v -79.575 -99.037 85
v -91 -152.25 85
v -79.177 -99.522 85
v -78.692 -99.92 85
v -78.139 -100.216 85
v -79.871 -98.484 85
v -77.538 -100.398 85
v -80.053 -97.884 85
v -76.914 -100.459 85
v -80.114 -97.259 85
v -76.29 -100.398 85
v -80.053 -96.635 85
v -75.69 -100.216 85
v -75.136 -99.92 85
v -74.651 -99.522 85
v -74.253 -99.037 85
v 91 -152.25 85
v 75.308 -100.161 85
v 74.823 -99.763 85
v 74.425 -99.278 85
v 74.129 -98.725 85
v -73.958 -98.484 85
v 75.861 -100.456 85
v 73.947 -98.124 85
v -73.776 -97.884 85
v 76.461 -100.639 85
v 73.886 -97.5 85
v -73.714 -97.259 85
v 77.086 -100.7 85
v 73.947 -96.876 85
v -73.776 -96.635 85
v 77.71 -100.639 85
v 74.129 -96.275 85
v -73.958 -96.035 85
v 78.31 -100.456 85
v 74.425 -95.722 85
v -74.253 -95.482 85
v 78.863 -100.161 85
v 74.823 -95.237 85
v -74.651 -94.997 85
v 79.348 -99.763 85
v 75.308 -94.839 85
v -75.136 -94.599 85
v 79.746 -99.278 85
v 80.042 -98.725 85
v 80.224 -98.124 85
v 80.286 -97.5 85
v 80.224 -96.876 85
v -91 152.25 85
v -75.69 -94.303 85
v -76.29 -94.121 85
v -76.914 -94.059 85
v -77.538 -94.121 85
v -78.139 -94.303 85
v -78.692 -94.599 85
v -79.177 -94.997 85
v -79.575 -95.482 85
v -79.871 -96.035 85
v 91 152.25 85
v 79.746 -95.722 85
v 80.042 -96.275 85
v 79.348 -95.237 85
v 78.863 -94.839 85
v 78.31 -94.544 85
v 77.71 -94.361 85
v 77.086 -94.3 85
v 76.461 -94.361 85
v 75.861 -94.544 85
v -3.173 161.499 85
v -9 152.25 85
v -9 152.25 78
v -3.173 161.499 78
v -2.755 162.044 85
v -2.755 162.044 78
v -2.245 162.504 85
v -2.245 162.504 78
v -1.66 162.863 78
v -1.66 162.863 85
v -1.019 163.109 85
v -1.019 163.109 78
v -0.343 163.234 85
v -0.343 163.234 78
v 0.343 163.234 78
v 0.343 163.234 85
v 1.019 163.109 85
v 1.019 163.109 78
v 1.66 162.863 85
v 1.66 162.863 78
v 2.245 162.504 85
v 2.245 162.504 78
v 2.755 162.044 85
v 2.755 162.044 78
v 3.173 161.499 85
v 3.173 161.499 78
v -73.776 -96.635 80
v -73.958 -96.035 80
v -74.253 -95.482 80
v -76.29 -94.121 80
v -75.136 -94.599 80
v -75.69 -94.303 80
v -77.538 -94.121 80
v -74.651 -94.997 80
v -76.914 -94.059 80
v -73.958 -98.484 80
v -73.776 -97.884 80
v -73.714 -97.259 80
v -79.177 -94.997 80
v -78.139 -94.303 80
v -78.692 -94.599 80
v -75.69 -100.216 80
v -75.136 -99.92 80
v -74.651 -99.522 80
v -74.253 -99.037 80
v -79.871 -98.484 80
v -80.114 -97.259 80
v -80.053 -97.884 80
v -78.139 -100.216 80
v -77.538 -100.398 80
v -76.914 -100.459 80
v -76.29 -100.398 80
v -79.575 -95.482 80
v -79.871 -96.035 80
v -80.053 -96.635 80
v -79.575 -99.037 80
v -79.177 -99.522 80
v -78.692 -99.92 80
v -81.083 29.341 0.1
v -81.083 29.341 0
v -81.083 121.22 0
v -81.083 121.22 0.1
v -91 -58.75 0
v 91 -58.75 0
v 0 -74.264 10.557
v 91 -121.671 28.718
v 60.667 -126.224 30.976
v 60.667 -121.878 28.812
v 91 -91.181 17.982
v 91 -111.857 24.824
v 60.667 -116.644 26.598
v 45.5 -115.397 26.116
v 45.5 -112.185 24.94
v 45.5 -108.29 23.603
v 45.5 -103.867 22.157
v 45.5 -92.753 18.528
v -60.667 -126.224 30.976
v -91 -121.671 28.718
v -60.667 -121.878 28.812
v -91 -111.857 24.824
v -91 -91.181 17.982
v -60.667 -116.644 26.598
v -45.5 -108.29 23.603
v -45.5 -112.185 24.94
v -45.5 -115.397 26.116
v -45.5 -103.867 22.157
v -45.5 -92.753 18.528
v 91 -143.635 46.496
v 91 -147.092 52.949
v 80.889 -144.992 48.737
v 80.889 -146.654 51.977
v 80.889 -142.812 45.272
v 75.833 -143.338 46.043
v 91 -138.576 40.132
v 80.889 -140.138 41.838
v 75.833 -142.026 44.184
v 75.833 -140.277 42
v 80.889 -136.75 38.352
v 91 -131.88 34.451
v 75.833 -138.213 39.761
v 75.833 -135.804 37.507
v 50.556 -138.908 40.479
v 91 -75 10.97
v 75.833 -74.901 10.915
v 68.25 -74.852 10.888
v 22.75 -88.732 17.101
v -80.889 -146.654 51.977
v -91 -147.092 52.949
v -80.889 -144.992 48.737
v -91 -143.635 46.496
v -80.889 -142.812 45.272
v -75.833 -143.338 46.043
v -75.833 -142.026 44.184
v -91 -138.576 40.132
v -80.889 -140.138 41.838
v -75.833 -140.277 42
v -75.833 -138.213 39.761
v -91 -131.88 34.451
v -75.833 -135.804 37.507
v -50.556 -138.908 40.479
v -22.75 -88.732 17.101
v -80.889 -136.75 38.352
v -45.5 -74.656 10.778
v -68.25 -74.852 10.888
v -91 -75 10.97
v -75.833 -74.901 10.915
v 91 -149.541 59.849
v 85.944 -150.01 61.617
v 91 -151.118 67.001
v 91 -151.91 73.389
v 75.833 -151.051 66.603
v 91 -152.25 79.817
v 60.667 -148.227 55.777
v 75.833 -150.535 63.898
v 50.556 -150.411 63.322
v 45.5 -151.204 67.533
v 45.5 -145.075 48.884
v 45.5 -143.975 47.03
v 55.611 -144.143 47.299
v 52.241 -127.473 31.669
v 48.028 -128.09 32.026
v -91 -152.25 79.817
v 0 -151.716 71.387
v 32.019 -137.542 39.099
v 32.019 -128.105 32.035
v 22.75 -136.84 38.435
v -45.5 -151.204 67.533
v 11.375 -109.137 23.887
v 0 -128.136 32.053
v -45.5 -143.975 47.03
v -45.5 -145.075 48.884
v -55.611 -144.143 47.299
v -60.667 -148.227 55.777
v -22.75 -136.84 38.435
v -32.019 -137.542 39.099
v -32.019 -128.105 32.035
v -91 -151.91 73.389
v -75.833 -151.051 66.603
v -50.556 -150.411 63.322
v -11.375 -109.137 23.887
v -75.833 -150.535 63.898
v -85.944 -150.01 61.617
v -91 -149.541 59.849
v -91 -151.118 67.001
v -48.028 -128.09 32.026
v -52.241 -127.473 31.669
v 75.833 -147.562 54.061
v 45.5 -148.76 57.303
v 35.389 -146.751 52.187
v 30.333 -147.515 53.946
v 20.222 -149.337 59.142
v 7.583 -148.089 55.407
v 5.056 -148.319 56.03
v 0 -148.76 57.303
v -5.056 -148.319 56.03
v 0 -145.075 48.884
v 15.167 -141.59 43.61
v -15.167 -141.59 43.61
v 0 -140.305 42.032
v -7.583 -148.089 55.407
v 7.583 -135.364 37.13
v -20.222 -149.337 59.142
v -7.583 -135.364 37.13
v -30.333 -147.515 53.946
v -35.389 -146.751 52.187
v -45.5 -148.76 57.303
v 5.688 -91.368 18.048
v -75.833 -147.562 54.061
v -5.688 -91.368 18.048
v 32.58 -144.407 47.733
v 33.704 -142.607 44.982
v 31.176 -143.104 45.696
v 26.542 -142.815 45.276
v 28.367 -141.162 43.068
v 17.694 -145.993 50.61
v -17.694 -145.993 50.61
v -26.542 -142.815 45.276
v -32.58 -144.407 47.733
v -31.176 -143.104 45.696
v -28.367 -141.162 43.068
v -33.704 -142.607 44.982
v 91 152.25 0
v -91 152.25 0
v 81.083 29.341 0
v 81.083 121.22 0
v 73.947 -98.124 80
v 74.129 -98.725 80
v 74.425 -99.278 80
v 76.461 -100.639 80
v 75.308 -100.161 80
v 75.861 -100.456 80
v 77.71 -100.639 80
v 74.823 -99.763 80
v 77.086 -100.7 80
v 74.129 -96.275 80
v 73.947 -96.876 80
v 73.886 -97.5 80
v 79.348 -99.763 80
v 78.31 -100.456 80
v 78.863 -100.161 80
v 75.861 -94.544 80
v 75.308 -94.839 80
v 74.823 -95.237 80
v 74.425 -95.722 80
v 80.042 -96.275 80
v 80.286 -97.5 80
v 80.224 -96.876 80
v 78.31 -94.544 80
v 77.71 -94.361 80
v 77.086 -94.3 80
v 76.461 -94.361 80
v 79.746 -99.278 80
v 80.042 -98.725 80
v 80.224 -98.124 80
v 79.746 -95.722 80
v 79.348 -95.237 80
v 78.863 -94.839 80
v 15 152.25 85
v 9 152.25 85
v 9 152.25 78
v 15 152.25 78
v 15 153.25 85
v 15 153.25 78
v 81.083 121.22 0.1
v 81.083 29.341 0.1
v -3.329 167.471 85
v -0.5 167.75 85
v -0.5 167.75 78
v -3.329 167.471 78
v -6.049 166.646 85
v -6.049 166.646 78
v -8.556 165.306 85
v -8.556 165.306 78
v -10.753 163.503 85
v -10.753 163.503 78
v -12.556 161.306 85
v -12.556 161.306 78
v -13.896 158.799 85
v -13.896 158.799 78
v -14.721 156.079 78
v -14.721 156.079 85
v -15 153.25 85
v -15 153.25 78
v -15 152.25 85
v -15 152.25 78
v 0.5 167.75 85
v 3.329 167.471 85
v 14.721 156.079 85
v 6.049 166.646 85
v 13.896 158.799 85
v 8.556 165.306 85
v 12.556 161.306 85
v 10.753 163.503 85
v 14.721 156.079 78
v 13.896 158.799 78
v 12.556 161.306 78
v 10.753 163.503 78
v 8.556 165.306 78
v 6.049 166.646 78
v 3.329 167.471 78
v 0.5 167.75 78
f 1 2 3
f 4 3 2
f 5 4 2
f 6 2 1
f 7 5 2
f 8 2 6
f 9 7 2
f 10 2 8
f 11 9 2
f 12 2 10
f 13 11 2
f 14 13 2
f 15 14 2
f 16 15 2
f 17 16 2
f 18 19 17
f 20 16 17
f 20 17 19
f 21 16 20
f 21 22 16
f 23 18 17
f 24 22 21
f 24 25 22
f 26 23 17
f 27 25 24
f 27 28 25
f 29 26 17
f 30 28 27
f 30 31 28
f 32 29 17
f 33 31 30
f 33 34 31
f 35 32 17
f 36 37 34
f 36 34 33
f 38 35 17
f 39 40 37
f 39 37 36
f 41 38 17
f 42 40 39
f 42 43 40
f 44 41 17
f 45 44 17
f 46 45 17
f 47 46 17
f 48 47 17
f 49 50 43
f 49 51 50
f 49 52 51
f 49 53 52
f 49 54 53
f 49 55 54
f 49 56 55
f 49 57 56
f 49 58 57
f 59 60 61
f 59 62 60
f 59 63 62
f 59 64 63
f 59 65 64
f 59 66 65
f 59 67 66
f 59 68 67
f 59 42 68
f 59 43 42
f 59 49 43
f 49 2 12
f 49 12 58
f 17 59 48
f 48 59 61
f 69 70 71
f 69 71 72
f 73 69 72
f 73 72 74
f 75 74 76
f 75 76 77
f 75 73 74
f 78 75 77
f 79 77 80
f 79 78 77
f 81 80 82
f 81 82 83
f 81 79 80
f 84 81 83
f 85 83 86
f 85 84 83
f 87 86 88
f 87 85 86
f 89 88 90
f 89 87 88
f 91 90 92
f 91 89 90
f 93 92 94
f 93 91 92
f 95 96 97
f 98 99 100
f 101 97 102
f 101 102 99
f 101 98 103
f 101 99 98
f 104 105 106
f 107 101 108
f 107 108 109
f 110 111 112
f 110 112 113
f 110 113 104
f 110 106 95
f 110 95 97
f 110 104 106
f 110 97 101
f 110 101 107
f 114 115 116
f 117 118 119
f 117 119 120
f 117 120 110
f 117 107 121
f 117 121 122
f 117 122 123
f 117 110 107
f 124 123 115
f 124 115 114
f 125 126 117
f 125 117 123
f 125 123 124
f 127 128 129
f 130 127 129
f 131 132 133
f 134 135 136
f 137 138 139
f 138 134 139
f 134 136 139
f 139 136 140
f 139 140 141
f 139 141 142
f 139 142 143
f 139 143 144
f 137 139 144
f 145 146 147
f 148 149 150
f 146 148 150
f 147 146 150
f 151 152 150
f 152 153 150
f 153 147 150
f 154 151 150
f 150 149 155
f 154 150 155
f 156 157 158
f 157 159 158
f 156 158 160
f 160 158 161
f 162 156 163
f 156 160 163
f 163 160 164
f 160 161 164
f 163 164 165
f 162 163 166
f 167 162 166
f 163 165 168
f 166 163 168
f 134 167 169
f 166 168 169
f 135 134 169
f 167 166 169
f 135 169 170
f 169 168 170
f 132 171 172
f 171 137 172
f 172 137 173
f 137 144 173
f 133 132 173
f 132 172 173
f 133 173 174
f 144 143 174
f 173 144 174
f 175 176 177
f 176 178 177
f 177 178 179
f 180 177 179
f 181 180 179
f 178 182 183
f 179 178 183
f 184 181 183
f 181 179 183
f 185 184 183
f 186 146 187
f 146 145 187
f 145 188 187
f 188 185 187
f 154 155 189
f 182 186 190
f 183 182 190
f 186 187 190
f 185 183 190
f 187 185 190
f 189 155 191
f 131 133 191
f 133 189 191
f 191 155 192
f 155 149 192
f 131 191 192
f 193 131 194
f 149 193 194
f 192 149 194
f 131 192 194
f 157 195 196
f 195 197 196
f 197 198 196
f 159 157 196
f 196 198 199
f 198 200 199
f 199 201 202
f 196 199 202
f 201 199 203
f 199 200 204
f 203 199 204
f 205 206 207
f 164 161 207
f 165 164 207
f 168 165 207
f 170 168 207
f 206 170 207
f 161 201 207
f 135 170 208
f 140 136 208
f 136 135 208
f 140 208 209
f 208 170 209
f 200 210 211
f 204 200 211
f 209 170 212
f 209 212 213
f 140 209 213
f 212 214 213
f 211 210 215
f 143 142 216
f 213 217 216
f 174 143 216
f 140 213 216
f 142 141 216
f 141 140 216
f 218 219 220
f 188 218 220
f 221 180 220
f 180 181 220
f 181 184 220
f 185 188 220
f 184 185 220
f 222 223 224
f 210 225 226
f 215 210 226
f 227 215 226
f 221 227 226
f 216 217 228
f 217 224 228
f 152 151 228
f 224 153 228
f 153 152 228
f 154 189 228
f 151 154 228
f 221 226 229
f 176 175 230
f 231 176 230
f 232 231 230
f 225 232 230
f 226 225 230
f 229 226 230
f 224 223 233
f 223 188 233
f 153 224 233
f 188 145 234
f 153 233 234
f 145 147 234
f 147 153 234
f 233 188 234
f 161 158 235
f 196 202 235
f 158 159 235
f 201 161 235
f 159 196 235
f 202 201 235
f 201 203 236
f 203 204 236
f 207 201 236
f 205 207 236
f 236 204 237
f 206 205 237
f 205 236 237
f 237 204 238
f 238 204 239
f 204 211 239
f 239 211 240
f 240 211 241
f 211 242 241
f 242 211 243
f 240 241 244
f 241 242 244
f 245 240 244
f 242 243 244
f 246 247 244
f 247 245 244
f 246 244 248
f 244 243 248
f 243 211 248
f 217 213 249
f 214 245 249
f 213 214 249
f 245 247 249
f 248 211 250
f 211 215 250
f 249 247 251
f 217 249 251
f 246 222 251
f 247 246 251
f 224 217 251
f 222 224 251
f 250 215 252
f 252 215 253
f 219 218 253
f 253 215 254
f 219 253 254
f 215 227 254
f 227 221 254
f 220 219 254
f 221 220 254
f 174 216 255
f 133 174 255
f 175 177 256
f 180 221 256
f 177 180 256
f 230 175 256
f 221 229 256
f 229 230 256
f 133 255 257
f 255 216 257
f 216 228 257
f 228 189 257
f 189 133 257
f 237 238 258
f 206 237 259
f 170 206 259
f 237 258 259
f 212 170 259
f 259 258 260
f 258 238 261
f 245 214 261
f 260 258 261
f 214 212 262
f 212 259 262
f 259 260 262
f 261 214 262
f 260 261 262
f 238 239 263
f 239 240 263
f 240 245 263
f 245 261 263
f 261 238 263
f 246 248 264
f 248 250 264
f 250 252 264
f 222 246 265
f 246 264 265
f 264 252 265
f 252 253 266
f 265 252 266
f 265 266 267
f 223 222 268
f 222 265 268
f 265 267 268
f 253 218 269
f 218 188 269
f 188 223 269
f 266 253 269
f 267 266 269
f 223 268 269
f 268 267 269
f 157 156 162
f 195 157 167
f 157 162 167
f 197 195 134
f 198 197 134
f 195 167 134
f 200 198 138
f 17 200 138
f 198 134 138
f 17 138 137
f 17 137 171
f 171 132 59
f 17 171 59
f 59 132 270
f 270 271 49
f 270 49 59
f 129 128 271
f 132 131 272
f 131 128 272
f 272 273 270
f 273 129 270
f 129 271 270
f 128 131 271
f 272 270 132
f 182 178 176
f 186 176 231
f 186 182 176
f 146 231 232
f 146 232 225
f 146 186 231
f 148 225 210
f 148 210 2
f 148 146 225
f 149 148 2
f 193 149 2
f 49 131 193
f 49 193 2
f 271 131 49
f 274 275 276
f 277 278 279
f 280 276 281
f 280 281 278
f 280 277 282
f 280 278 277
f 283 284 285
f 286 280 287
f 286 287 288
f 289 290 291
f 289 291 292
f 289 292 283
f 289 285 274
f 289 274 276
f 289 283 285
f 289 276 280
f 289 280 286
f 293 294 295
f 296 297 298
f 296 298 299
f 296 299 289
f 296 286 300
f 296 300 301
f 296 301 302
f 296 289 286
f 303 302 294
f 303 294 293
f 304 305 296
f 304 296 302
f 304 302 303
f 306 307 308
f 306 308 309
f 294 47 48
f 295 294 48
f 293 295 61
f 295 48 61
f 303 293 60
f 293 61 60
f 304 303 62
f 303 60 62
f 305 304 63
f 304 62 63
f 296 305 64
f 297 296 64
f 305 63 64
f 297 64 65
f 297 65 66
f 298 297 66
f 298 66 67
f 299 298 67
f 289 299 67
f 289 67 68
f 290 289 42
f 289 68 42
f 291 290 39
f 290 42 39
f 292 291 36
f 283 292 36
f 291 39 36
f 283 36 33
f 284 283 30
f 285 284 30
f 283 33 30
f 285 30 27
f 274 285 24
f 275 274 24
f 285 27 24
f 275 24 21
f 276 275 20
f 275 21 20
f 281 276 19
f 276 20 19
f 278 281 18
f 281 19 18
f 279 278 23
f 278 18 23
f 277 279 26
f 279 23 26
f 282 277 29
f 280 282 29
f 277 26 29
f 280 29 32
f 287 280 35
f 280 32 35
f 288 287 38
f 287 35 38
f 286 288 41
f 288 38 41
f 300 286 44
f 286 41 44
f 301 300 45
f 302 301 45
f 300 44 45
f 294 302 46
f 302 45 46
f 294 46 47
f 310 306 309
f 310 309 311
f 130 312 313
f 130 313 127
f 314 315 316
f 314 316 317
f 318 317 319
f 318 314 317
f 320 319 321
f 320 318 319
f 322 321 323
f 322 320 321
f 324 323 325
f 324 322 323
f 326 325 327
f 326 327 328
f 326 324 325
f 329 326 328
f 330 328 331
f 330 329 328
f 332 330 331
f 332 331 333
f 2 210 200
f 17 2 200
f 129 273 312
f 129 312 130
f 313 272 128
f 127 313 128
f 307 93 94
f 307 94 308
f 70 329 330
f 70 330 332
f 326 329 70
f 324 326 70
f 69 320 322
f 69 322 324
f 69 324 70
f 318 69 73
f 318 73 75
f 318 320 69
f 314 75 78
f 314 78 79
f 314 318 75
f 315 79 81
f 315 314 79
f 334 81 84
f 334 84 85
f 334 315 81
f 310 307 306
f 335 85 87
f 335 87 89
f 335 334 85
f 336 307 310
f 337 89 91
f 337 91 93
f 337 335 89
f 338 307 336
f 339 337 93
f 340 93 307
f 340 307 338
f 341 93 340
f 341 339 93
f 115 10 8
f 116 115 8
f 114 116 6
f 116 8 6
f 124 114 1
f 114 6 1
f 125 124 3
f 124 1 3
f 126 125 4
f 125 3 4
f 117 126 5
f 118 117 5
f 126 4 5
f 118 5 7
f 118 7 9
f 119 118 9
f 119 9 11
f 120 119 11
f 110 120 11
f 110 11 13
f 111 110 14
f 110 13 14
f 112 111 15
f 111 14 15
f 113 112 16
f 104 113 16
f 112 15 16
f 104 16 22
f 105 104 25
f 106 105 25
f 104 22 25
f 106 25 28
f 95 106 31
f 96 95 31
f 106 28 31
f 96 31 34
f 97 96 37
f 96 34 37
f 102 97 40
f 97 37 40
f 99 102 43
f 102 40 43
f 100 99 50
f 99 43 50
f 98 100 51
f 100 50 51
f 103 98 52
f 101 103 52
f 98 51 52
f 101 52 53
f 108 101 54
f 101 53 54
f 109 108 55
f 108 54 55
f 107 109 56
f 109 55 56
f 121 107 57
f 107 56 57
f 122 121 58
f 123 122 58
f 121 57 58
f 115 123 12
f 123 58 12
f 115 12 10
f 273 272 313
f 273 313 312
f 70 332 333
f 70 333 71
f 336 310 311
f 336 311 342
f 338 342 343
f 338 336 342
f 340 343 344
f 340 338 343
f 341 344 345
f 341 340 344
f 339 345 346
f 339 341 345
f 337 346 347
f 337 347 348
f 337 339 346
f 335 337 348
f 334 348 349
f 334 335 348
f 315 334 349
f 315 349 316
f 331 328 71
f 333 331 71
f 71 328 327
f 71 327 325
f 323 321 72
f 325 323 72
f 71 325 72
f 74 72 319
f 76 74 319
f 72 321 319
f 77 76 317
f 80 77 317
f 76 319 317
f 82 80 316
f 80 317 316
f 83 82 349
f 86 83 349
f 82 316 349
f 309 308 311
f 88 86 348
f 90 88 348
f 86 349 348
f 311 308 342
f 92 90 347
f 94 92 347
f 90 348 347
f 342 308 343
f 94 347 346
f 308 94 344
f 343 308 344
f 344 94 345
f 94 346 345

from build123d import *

# Parameters (mm, degrees)
SKETCH_1_W               = 182
SKETCH_1_H               = 304.5
EXTRUDE_1_DEPTH          = 85
EXTRUDE_2_DEPTH          = 7
CUT_EXTRUDE_1_DEPTH      = 262.704150712
CUT_EXTRUDE_1_DEPTH_BACK = 262.704150712
SKETCH_5_R               = 3.75
SKETCH_5_R_2             = 3.2
CUT_EXTRUDE_2_DEPTH      = 5
SKETCH_6_W               = 162.16521046
SKETCH_6_H               = 91.878306209
CUT_EXTRUDE_3_DEPTH      = 0.1


with BuildPart() as part:
    # Эскиз1 → Бобышка-Вытянуть1 (new body)
    with BuildSketch(Plane.XY):
        Rectangle(SKETCH_1_W, SKETCH_1_H)
    extrude(amount=EXTRUDE_1_DEPTH)

    # Эскиз4 → Вырез-Вытянуть1 (cut, two sides: drawn at the far end of the back side and taken through both)
    with BuildSketch(Plane(origin=(91, 0, 0), x_dir=(0, 0, -1), z_dir=(1, 0, 0)).offset(-CUT_EXTRUDE_1_DEPTH_BACK)):
        with BuildLine():
            add(Edge.make_bspline(
                [(-79.816818668, -152.25), (-21.71031979, -150.970361607), (-29.675754805, -98.029408424), (-3.644977075, -63.810589699), (0, -58.75)],
                knots=[0.023977741, 0.023977741, 0.023977741, 0.023977741, 0.856671902, 1, 1, 1, 1], degree=3))
            Line((-79.816818668, -152.25), (0, -152.25))
            Line((0, -152.25), (0, -58.75))
        make_face()
    extrude(amount=CUT_EXTRUDE_1_DEPTH + CUT_EXTRUDE_1_DEPTH_BACK, mode=Mode.SUBTRACT)

    # Эскиз5 → Вырез-Вытянуть2 (cut)
    with BuildSketch(Plane.XY.offset(85)):
        with Locations((0, 159.5)):
            Circle(SKETCH_5_R)
        with Locations((77.085640869, -97.5)):
            Circle(SKETCH_5_R_2)
        with Locations(Location((-76.914171143, -97.259375294, 0), (0, 0, 180))):
            Circle(SKETCH_5_R_2)
    extrude(amount=-CUT_EXTRUDE_2_DEPTH, mode=Mode.SUBTRACT)

    # Эскиз6 → Вырез-Вытянуть3 (cut)
    with BuildSketch(Plane(origin=(0, 0, 0), x_dir=(-1, 0, 0), z_dir=(0, 0, -1))):
        with Locations((0, 75.280555064)):
            Rectangle(SKETCH_6_W, SKETCH_6_H)
    extrude(amount=-CUT_EXTRUDE_3_DEPTH, mode=Mode.SUBTRACT)


with BuildPart() as body_2:
    # Эскиз3 → Бобышка-Вытянуть2 (new body)
    with BuildSketch(Plane.XY.offset(85)):
        with BuildLine():
            Line((-9, 152.25), (-3.172788215, 161.498978474))
            ThreePointArc((-3.172788215, 161.498978474), (0, 163.25), (3.172788215, 161.498978474))
            Line((3.172788215, 161.498978474), (9, 152.25))
            Line((9, 152.25), (15, 152.25))
            Line((15, 152.25), (15, 153.25))
            ThreePointArc((15, 153.25), (10.753048327, 163.503048327), (0.5, 167.75))
            Line((0.5, 167.75), (-0.5, 167.75))
            ThreePointArc((-0.5, 167.75), (-10.753048327, 163.503048327), (-15, 153.25))
            Line((-15, 153.25), (-15, 152.25))
            Line((-15, 152.25), (-9, 152.25))
        make_face()
    extrude(amount=-EXTRUDE_2_DEPTH)


solid = Compound([part.part, body_2.part])
